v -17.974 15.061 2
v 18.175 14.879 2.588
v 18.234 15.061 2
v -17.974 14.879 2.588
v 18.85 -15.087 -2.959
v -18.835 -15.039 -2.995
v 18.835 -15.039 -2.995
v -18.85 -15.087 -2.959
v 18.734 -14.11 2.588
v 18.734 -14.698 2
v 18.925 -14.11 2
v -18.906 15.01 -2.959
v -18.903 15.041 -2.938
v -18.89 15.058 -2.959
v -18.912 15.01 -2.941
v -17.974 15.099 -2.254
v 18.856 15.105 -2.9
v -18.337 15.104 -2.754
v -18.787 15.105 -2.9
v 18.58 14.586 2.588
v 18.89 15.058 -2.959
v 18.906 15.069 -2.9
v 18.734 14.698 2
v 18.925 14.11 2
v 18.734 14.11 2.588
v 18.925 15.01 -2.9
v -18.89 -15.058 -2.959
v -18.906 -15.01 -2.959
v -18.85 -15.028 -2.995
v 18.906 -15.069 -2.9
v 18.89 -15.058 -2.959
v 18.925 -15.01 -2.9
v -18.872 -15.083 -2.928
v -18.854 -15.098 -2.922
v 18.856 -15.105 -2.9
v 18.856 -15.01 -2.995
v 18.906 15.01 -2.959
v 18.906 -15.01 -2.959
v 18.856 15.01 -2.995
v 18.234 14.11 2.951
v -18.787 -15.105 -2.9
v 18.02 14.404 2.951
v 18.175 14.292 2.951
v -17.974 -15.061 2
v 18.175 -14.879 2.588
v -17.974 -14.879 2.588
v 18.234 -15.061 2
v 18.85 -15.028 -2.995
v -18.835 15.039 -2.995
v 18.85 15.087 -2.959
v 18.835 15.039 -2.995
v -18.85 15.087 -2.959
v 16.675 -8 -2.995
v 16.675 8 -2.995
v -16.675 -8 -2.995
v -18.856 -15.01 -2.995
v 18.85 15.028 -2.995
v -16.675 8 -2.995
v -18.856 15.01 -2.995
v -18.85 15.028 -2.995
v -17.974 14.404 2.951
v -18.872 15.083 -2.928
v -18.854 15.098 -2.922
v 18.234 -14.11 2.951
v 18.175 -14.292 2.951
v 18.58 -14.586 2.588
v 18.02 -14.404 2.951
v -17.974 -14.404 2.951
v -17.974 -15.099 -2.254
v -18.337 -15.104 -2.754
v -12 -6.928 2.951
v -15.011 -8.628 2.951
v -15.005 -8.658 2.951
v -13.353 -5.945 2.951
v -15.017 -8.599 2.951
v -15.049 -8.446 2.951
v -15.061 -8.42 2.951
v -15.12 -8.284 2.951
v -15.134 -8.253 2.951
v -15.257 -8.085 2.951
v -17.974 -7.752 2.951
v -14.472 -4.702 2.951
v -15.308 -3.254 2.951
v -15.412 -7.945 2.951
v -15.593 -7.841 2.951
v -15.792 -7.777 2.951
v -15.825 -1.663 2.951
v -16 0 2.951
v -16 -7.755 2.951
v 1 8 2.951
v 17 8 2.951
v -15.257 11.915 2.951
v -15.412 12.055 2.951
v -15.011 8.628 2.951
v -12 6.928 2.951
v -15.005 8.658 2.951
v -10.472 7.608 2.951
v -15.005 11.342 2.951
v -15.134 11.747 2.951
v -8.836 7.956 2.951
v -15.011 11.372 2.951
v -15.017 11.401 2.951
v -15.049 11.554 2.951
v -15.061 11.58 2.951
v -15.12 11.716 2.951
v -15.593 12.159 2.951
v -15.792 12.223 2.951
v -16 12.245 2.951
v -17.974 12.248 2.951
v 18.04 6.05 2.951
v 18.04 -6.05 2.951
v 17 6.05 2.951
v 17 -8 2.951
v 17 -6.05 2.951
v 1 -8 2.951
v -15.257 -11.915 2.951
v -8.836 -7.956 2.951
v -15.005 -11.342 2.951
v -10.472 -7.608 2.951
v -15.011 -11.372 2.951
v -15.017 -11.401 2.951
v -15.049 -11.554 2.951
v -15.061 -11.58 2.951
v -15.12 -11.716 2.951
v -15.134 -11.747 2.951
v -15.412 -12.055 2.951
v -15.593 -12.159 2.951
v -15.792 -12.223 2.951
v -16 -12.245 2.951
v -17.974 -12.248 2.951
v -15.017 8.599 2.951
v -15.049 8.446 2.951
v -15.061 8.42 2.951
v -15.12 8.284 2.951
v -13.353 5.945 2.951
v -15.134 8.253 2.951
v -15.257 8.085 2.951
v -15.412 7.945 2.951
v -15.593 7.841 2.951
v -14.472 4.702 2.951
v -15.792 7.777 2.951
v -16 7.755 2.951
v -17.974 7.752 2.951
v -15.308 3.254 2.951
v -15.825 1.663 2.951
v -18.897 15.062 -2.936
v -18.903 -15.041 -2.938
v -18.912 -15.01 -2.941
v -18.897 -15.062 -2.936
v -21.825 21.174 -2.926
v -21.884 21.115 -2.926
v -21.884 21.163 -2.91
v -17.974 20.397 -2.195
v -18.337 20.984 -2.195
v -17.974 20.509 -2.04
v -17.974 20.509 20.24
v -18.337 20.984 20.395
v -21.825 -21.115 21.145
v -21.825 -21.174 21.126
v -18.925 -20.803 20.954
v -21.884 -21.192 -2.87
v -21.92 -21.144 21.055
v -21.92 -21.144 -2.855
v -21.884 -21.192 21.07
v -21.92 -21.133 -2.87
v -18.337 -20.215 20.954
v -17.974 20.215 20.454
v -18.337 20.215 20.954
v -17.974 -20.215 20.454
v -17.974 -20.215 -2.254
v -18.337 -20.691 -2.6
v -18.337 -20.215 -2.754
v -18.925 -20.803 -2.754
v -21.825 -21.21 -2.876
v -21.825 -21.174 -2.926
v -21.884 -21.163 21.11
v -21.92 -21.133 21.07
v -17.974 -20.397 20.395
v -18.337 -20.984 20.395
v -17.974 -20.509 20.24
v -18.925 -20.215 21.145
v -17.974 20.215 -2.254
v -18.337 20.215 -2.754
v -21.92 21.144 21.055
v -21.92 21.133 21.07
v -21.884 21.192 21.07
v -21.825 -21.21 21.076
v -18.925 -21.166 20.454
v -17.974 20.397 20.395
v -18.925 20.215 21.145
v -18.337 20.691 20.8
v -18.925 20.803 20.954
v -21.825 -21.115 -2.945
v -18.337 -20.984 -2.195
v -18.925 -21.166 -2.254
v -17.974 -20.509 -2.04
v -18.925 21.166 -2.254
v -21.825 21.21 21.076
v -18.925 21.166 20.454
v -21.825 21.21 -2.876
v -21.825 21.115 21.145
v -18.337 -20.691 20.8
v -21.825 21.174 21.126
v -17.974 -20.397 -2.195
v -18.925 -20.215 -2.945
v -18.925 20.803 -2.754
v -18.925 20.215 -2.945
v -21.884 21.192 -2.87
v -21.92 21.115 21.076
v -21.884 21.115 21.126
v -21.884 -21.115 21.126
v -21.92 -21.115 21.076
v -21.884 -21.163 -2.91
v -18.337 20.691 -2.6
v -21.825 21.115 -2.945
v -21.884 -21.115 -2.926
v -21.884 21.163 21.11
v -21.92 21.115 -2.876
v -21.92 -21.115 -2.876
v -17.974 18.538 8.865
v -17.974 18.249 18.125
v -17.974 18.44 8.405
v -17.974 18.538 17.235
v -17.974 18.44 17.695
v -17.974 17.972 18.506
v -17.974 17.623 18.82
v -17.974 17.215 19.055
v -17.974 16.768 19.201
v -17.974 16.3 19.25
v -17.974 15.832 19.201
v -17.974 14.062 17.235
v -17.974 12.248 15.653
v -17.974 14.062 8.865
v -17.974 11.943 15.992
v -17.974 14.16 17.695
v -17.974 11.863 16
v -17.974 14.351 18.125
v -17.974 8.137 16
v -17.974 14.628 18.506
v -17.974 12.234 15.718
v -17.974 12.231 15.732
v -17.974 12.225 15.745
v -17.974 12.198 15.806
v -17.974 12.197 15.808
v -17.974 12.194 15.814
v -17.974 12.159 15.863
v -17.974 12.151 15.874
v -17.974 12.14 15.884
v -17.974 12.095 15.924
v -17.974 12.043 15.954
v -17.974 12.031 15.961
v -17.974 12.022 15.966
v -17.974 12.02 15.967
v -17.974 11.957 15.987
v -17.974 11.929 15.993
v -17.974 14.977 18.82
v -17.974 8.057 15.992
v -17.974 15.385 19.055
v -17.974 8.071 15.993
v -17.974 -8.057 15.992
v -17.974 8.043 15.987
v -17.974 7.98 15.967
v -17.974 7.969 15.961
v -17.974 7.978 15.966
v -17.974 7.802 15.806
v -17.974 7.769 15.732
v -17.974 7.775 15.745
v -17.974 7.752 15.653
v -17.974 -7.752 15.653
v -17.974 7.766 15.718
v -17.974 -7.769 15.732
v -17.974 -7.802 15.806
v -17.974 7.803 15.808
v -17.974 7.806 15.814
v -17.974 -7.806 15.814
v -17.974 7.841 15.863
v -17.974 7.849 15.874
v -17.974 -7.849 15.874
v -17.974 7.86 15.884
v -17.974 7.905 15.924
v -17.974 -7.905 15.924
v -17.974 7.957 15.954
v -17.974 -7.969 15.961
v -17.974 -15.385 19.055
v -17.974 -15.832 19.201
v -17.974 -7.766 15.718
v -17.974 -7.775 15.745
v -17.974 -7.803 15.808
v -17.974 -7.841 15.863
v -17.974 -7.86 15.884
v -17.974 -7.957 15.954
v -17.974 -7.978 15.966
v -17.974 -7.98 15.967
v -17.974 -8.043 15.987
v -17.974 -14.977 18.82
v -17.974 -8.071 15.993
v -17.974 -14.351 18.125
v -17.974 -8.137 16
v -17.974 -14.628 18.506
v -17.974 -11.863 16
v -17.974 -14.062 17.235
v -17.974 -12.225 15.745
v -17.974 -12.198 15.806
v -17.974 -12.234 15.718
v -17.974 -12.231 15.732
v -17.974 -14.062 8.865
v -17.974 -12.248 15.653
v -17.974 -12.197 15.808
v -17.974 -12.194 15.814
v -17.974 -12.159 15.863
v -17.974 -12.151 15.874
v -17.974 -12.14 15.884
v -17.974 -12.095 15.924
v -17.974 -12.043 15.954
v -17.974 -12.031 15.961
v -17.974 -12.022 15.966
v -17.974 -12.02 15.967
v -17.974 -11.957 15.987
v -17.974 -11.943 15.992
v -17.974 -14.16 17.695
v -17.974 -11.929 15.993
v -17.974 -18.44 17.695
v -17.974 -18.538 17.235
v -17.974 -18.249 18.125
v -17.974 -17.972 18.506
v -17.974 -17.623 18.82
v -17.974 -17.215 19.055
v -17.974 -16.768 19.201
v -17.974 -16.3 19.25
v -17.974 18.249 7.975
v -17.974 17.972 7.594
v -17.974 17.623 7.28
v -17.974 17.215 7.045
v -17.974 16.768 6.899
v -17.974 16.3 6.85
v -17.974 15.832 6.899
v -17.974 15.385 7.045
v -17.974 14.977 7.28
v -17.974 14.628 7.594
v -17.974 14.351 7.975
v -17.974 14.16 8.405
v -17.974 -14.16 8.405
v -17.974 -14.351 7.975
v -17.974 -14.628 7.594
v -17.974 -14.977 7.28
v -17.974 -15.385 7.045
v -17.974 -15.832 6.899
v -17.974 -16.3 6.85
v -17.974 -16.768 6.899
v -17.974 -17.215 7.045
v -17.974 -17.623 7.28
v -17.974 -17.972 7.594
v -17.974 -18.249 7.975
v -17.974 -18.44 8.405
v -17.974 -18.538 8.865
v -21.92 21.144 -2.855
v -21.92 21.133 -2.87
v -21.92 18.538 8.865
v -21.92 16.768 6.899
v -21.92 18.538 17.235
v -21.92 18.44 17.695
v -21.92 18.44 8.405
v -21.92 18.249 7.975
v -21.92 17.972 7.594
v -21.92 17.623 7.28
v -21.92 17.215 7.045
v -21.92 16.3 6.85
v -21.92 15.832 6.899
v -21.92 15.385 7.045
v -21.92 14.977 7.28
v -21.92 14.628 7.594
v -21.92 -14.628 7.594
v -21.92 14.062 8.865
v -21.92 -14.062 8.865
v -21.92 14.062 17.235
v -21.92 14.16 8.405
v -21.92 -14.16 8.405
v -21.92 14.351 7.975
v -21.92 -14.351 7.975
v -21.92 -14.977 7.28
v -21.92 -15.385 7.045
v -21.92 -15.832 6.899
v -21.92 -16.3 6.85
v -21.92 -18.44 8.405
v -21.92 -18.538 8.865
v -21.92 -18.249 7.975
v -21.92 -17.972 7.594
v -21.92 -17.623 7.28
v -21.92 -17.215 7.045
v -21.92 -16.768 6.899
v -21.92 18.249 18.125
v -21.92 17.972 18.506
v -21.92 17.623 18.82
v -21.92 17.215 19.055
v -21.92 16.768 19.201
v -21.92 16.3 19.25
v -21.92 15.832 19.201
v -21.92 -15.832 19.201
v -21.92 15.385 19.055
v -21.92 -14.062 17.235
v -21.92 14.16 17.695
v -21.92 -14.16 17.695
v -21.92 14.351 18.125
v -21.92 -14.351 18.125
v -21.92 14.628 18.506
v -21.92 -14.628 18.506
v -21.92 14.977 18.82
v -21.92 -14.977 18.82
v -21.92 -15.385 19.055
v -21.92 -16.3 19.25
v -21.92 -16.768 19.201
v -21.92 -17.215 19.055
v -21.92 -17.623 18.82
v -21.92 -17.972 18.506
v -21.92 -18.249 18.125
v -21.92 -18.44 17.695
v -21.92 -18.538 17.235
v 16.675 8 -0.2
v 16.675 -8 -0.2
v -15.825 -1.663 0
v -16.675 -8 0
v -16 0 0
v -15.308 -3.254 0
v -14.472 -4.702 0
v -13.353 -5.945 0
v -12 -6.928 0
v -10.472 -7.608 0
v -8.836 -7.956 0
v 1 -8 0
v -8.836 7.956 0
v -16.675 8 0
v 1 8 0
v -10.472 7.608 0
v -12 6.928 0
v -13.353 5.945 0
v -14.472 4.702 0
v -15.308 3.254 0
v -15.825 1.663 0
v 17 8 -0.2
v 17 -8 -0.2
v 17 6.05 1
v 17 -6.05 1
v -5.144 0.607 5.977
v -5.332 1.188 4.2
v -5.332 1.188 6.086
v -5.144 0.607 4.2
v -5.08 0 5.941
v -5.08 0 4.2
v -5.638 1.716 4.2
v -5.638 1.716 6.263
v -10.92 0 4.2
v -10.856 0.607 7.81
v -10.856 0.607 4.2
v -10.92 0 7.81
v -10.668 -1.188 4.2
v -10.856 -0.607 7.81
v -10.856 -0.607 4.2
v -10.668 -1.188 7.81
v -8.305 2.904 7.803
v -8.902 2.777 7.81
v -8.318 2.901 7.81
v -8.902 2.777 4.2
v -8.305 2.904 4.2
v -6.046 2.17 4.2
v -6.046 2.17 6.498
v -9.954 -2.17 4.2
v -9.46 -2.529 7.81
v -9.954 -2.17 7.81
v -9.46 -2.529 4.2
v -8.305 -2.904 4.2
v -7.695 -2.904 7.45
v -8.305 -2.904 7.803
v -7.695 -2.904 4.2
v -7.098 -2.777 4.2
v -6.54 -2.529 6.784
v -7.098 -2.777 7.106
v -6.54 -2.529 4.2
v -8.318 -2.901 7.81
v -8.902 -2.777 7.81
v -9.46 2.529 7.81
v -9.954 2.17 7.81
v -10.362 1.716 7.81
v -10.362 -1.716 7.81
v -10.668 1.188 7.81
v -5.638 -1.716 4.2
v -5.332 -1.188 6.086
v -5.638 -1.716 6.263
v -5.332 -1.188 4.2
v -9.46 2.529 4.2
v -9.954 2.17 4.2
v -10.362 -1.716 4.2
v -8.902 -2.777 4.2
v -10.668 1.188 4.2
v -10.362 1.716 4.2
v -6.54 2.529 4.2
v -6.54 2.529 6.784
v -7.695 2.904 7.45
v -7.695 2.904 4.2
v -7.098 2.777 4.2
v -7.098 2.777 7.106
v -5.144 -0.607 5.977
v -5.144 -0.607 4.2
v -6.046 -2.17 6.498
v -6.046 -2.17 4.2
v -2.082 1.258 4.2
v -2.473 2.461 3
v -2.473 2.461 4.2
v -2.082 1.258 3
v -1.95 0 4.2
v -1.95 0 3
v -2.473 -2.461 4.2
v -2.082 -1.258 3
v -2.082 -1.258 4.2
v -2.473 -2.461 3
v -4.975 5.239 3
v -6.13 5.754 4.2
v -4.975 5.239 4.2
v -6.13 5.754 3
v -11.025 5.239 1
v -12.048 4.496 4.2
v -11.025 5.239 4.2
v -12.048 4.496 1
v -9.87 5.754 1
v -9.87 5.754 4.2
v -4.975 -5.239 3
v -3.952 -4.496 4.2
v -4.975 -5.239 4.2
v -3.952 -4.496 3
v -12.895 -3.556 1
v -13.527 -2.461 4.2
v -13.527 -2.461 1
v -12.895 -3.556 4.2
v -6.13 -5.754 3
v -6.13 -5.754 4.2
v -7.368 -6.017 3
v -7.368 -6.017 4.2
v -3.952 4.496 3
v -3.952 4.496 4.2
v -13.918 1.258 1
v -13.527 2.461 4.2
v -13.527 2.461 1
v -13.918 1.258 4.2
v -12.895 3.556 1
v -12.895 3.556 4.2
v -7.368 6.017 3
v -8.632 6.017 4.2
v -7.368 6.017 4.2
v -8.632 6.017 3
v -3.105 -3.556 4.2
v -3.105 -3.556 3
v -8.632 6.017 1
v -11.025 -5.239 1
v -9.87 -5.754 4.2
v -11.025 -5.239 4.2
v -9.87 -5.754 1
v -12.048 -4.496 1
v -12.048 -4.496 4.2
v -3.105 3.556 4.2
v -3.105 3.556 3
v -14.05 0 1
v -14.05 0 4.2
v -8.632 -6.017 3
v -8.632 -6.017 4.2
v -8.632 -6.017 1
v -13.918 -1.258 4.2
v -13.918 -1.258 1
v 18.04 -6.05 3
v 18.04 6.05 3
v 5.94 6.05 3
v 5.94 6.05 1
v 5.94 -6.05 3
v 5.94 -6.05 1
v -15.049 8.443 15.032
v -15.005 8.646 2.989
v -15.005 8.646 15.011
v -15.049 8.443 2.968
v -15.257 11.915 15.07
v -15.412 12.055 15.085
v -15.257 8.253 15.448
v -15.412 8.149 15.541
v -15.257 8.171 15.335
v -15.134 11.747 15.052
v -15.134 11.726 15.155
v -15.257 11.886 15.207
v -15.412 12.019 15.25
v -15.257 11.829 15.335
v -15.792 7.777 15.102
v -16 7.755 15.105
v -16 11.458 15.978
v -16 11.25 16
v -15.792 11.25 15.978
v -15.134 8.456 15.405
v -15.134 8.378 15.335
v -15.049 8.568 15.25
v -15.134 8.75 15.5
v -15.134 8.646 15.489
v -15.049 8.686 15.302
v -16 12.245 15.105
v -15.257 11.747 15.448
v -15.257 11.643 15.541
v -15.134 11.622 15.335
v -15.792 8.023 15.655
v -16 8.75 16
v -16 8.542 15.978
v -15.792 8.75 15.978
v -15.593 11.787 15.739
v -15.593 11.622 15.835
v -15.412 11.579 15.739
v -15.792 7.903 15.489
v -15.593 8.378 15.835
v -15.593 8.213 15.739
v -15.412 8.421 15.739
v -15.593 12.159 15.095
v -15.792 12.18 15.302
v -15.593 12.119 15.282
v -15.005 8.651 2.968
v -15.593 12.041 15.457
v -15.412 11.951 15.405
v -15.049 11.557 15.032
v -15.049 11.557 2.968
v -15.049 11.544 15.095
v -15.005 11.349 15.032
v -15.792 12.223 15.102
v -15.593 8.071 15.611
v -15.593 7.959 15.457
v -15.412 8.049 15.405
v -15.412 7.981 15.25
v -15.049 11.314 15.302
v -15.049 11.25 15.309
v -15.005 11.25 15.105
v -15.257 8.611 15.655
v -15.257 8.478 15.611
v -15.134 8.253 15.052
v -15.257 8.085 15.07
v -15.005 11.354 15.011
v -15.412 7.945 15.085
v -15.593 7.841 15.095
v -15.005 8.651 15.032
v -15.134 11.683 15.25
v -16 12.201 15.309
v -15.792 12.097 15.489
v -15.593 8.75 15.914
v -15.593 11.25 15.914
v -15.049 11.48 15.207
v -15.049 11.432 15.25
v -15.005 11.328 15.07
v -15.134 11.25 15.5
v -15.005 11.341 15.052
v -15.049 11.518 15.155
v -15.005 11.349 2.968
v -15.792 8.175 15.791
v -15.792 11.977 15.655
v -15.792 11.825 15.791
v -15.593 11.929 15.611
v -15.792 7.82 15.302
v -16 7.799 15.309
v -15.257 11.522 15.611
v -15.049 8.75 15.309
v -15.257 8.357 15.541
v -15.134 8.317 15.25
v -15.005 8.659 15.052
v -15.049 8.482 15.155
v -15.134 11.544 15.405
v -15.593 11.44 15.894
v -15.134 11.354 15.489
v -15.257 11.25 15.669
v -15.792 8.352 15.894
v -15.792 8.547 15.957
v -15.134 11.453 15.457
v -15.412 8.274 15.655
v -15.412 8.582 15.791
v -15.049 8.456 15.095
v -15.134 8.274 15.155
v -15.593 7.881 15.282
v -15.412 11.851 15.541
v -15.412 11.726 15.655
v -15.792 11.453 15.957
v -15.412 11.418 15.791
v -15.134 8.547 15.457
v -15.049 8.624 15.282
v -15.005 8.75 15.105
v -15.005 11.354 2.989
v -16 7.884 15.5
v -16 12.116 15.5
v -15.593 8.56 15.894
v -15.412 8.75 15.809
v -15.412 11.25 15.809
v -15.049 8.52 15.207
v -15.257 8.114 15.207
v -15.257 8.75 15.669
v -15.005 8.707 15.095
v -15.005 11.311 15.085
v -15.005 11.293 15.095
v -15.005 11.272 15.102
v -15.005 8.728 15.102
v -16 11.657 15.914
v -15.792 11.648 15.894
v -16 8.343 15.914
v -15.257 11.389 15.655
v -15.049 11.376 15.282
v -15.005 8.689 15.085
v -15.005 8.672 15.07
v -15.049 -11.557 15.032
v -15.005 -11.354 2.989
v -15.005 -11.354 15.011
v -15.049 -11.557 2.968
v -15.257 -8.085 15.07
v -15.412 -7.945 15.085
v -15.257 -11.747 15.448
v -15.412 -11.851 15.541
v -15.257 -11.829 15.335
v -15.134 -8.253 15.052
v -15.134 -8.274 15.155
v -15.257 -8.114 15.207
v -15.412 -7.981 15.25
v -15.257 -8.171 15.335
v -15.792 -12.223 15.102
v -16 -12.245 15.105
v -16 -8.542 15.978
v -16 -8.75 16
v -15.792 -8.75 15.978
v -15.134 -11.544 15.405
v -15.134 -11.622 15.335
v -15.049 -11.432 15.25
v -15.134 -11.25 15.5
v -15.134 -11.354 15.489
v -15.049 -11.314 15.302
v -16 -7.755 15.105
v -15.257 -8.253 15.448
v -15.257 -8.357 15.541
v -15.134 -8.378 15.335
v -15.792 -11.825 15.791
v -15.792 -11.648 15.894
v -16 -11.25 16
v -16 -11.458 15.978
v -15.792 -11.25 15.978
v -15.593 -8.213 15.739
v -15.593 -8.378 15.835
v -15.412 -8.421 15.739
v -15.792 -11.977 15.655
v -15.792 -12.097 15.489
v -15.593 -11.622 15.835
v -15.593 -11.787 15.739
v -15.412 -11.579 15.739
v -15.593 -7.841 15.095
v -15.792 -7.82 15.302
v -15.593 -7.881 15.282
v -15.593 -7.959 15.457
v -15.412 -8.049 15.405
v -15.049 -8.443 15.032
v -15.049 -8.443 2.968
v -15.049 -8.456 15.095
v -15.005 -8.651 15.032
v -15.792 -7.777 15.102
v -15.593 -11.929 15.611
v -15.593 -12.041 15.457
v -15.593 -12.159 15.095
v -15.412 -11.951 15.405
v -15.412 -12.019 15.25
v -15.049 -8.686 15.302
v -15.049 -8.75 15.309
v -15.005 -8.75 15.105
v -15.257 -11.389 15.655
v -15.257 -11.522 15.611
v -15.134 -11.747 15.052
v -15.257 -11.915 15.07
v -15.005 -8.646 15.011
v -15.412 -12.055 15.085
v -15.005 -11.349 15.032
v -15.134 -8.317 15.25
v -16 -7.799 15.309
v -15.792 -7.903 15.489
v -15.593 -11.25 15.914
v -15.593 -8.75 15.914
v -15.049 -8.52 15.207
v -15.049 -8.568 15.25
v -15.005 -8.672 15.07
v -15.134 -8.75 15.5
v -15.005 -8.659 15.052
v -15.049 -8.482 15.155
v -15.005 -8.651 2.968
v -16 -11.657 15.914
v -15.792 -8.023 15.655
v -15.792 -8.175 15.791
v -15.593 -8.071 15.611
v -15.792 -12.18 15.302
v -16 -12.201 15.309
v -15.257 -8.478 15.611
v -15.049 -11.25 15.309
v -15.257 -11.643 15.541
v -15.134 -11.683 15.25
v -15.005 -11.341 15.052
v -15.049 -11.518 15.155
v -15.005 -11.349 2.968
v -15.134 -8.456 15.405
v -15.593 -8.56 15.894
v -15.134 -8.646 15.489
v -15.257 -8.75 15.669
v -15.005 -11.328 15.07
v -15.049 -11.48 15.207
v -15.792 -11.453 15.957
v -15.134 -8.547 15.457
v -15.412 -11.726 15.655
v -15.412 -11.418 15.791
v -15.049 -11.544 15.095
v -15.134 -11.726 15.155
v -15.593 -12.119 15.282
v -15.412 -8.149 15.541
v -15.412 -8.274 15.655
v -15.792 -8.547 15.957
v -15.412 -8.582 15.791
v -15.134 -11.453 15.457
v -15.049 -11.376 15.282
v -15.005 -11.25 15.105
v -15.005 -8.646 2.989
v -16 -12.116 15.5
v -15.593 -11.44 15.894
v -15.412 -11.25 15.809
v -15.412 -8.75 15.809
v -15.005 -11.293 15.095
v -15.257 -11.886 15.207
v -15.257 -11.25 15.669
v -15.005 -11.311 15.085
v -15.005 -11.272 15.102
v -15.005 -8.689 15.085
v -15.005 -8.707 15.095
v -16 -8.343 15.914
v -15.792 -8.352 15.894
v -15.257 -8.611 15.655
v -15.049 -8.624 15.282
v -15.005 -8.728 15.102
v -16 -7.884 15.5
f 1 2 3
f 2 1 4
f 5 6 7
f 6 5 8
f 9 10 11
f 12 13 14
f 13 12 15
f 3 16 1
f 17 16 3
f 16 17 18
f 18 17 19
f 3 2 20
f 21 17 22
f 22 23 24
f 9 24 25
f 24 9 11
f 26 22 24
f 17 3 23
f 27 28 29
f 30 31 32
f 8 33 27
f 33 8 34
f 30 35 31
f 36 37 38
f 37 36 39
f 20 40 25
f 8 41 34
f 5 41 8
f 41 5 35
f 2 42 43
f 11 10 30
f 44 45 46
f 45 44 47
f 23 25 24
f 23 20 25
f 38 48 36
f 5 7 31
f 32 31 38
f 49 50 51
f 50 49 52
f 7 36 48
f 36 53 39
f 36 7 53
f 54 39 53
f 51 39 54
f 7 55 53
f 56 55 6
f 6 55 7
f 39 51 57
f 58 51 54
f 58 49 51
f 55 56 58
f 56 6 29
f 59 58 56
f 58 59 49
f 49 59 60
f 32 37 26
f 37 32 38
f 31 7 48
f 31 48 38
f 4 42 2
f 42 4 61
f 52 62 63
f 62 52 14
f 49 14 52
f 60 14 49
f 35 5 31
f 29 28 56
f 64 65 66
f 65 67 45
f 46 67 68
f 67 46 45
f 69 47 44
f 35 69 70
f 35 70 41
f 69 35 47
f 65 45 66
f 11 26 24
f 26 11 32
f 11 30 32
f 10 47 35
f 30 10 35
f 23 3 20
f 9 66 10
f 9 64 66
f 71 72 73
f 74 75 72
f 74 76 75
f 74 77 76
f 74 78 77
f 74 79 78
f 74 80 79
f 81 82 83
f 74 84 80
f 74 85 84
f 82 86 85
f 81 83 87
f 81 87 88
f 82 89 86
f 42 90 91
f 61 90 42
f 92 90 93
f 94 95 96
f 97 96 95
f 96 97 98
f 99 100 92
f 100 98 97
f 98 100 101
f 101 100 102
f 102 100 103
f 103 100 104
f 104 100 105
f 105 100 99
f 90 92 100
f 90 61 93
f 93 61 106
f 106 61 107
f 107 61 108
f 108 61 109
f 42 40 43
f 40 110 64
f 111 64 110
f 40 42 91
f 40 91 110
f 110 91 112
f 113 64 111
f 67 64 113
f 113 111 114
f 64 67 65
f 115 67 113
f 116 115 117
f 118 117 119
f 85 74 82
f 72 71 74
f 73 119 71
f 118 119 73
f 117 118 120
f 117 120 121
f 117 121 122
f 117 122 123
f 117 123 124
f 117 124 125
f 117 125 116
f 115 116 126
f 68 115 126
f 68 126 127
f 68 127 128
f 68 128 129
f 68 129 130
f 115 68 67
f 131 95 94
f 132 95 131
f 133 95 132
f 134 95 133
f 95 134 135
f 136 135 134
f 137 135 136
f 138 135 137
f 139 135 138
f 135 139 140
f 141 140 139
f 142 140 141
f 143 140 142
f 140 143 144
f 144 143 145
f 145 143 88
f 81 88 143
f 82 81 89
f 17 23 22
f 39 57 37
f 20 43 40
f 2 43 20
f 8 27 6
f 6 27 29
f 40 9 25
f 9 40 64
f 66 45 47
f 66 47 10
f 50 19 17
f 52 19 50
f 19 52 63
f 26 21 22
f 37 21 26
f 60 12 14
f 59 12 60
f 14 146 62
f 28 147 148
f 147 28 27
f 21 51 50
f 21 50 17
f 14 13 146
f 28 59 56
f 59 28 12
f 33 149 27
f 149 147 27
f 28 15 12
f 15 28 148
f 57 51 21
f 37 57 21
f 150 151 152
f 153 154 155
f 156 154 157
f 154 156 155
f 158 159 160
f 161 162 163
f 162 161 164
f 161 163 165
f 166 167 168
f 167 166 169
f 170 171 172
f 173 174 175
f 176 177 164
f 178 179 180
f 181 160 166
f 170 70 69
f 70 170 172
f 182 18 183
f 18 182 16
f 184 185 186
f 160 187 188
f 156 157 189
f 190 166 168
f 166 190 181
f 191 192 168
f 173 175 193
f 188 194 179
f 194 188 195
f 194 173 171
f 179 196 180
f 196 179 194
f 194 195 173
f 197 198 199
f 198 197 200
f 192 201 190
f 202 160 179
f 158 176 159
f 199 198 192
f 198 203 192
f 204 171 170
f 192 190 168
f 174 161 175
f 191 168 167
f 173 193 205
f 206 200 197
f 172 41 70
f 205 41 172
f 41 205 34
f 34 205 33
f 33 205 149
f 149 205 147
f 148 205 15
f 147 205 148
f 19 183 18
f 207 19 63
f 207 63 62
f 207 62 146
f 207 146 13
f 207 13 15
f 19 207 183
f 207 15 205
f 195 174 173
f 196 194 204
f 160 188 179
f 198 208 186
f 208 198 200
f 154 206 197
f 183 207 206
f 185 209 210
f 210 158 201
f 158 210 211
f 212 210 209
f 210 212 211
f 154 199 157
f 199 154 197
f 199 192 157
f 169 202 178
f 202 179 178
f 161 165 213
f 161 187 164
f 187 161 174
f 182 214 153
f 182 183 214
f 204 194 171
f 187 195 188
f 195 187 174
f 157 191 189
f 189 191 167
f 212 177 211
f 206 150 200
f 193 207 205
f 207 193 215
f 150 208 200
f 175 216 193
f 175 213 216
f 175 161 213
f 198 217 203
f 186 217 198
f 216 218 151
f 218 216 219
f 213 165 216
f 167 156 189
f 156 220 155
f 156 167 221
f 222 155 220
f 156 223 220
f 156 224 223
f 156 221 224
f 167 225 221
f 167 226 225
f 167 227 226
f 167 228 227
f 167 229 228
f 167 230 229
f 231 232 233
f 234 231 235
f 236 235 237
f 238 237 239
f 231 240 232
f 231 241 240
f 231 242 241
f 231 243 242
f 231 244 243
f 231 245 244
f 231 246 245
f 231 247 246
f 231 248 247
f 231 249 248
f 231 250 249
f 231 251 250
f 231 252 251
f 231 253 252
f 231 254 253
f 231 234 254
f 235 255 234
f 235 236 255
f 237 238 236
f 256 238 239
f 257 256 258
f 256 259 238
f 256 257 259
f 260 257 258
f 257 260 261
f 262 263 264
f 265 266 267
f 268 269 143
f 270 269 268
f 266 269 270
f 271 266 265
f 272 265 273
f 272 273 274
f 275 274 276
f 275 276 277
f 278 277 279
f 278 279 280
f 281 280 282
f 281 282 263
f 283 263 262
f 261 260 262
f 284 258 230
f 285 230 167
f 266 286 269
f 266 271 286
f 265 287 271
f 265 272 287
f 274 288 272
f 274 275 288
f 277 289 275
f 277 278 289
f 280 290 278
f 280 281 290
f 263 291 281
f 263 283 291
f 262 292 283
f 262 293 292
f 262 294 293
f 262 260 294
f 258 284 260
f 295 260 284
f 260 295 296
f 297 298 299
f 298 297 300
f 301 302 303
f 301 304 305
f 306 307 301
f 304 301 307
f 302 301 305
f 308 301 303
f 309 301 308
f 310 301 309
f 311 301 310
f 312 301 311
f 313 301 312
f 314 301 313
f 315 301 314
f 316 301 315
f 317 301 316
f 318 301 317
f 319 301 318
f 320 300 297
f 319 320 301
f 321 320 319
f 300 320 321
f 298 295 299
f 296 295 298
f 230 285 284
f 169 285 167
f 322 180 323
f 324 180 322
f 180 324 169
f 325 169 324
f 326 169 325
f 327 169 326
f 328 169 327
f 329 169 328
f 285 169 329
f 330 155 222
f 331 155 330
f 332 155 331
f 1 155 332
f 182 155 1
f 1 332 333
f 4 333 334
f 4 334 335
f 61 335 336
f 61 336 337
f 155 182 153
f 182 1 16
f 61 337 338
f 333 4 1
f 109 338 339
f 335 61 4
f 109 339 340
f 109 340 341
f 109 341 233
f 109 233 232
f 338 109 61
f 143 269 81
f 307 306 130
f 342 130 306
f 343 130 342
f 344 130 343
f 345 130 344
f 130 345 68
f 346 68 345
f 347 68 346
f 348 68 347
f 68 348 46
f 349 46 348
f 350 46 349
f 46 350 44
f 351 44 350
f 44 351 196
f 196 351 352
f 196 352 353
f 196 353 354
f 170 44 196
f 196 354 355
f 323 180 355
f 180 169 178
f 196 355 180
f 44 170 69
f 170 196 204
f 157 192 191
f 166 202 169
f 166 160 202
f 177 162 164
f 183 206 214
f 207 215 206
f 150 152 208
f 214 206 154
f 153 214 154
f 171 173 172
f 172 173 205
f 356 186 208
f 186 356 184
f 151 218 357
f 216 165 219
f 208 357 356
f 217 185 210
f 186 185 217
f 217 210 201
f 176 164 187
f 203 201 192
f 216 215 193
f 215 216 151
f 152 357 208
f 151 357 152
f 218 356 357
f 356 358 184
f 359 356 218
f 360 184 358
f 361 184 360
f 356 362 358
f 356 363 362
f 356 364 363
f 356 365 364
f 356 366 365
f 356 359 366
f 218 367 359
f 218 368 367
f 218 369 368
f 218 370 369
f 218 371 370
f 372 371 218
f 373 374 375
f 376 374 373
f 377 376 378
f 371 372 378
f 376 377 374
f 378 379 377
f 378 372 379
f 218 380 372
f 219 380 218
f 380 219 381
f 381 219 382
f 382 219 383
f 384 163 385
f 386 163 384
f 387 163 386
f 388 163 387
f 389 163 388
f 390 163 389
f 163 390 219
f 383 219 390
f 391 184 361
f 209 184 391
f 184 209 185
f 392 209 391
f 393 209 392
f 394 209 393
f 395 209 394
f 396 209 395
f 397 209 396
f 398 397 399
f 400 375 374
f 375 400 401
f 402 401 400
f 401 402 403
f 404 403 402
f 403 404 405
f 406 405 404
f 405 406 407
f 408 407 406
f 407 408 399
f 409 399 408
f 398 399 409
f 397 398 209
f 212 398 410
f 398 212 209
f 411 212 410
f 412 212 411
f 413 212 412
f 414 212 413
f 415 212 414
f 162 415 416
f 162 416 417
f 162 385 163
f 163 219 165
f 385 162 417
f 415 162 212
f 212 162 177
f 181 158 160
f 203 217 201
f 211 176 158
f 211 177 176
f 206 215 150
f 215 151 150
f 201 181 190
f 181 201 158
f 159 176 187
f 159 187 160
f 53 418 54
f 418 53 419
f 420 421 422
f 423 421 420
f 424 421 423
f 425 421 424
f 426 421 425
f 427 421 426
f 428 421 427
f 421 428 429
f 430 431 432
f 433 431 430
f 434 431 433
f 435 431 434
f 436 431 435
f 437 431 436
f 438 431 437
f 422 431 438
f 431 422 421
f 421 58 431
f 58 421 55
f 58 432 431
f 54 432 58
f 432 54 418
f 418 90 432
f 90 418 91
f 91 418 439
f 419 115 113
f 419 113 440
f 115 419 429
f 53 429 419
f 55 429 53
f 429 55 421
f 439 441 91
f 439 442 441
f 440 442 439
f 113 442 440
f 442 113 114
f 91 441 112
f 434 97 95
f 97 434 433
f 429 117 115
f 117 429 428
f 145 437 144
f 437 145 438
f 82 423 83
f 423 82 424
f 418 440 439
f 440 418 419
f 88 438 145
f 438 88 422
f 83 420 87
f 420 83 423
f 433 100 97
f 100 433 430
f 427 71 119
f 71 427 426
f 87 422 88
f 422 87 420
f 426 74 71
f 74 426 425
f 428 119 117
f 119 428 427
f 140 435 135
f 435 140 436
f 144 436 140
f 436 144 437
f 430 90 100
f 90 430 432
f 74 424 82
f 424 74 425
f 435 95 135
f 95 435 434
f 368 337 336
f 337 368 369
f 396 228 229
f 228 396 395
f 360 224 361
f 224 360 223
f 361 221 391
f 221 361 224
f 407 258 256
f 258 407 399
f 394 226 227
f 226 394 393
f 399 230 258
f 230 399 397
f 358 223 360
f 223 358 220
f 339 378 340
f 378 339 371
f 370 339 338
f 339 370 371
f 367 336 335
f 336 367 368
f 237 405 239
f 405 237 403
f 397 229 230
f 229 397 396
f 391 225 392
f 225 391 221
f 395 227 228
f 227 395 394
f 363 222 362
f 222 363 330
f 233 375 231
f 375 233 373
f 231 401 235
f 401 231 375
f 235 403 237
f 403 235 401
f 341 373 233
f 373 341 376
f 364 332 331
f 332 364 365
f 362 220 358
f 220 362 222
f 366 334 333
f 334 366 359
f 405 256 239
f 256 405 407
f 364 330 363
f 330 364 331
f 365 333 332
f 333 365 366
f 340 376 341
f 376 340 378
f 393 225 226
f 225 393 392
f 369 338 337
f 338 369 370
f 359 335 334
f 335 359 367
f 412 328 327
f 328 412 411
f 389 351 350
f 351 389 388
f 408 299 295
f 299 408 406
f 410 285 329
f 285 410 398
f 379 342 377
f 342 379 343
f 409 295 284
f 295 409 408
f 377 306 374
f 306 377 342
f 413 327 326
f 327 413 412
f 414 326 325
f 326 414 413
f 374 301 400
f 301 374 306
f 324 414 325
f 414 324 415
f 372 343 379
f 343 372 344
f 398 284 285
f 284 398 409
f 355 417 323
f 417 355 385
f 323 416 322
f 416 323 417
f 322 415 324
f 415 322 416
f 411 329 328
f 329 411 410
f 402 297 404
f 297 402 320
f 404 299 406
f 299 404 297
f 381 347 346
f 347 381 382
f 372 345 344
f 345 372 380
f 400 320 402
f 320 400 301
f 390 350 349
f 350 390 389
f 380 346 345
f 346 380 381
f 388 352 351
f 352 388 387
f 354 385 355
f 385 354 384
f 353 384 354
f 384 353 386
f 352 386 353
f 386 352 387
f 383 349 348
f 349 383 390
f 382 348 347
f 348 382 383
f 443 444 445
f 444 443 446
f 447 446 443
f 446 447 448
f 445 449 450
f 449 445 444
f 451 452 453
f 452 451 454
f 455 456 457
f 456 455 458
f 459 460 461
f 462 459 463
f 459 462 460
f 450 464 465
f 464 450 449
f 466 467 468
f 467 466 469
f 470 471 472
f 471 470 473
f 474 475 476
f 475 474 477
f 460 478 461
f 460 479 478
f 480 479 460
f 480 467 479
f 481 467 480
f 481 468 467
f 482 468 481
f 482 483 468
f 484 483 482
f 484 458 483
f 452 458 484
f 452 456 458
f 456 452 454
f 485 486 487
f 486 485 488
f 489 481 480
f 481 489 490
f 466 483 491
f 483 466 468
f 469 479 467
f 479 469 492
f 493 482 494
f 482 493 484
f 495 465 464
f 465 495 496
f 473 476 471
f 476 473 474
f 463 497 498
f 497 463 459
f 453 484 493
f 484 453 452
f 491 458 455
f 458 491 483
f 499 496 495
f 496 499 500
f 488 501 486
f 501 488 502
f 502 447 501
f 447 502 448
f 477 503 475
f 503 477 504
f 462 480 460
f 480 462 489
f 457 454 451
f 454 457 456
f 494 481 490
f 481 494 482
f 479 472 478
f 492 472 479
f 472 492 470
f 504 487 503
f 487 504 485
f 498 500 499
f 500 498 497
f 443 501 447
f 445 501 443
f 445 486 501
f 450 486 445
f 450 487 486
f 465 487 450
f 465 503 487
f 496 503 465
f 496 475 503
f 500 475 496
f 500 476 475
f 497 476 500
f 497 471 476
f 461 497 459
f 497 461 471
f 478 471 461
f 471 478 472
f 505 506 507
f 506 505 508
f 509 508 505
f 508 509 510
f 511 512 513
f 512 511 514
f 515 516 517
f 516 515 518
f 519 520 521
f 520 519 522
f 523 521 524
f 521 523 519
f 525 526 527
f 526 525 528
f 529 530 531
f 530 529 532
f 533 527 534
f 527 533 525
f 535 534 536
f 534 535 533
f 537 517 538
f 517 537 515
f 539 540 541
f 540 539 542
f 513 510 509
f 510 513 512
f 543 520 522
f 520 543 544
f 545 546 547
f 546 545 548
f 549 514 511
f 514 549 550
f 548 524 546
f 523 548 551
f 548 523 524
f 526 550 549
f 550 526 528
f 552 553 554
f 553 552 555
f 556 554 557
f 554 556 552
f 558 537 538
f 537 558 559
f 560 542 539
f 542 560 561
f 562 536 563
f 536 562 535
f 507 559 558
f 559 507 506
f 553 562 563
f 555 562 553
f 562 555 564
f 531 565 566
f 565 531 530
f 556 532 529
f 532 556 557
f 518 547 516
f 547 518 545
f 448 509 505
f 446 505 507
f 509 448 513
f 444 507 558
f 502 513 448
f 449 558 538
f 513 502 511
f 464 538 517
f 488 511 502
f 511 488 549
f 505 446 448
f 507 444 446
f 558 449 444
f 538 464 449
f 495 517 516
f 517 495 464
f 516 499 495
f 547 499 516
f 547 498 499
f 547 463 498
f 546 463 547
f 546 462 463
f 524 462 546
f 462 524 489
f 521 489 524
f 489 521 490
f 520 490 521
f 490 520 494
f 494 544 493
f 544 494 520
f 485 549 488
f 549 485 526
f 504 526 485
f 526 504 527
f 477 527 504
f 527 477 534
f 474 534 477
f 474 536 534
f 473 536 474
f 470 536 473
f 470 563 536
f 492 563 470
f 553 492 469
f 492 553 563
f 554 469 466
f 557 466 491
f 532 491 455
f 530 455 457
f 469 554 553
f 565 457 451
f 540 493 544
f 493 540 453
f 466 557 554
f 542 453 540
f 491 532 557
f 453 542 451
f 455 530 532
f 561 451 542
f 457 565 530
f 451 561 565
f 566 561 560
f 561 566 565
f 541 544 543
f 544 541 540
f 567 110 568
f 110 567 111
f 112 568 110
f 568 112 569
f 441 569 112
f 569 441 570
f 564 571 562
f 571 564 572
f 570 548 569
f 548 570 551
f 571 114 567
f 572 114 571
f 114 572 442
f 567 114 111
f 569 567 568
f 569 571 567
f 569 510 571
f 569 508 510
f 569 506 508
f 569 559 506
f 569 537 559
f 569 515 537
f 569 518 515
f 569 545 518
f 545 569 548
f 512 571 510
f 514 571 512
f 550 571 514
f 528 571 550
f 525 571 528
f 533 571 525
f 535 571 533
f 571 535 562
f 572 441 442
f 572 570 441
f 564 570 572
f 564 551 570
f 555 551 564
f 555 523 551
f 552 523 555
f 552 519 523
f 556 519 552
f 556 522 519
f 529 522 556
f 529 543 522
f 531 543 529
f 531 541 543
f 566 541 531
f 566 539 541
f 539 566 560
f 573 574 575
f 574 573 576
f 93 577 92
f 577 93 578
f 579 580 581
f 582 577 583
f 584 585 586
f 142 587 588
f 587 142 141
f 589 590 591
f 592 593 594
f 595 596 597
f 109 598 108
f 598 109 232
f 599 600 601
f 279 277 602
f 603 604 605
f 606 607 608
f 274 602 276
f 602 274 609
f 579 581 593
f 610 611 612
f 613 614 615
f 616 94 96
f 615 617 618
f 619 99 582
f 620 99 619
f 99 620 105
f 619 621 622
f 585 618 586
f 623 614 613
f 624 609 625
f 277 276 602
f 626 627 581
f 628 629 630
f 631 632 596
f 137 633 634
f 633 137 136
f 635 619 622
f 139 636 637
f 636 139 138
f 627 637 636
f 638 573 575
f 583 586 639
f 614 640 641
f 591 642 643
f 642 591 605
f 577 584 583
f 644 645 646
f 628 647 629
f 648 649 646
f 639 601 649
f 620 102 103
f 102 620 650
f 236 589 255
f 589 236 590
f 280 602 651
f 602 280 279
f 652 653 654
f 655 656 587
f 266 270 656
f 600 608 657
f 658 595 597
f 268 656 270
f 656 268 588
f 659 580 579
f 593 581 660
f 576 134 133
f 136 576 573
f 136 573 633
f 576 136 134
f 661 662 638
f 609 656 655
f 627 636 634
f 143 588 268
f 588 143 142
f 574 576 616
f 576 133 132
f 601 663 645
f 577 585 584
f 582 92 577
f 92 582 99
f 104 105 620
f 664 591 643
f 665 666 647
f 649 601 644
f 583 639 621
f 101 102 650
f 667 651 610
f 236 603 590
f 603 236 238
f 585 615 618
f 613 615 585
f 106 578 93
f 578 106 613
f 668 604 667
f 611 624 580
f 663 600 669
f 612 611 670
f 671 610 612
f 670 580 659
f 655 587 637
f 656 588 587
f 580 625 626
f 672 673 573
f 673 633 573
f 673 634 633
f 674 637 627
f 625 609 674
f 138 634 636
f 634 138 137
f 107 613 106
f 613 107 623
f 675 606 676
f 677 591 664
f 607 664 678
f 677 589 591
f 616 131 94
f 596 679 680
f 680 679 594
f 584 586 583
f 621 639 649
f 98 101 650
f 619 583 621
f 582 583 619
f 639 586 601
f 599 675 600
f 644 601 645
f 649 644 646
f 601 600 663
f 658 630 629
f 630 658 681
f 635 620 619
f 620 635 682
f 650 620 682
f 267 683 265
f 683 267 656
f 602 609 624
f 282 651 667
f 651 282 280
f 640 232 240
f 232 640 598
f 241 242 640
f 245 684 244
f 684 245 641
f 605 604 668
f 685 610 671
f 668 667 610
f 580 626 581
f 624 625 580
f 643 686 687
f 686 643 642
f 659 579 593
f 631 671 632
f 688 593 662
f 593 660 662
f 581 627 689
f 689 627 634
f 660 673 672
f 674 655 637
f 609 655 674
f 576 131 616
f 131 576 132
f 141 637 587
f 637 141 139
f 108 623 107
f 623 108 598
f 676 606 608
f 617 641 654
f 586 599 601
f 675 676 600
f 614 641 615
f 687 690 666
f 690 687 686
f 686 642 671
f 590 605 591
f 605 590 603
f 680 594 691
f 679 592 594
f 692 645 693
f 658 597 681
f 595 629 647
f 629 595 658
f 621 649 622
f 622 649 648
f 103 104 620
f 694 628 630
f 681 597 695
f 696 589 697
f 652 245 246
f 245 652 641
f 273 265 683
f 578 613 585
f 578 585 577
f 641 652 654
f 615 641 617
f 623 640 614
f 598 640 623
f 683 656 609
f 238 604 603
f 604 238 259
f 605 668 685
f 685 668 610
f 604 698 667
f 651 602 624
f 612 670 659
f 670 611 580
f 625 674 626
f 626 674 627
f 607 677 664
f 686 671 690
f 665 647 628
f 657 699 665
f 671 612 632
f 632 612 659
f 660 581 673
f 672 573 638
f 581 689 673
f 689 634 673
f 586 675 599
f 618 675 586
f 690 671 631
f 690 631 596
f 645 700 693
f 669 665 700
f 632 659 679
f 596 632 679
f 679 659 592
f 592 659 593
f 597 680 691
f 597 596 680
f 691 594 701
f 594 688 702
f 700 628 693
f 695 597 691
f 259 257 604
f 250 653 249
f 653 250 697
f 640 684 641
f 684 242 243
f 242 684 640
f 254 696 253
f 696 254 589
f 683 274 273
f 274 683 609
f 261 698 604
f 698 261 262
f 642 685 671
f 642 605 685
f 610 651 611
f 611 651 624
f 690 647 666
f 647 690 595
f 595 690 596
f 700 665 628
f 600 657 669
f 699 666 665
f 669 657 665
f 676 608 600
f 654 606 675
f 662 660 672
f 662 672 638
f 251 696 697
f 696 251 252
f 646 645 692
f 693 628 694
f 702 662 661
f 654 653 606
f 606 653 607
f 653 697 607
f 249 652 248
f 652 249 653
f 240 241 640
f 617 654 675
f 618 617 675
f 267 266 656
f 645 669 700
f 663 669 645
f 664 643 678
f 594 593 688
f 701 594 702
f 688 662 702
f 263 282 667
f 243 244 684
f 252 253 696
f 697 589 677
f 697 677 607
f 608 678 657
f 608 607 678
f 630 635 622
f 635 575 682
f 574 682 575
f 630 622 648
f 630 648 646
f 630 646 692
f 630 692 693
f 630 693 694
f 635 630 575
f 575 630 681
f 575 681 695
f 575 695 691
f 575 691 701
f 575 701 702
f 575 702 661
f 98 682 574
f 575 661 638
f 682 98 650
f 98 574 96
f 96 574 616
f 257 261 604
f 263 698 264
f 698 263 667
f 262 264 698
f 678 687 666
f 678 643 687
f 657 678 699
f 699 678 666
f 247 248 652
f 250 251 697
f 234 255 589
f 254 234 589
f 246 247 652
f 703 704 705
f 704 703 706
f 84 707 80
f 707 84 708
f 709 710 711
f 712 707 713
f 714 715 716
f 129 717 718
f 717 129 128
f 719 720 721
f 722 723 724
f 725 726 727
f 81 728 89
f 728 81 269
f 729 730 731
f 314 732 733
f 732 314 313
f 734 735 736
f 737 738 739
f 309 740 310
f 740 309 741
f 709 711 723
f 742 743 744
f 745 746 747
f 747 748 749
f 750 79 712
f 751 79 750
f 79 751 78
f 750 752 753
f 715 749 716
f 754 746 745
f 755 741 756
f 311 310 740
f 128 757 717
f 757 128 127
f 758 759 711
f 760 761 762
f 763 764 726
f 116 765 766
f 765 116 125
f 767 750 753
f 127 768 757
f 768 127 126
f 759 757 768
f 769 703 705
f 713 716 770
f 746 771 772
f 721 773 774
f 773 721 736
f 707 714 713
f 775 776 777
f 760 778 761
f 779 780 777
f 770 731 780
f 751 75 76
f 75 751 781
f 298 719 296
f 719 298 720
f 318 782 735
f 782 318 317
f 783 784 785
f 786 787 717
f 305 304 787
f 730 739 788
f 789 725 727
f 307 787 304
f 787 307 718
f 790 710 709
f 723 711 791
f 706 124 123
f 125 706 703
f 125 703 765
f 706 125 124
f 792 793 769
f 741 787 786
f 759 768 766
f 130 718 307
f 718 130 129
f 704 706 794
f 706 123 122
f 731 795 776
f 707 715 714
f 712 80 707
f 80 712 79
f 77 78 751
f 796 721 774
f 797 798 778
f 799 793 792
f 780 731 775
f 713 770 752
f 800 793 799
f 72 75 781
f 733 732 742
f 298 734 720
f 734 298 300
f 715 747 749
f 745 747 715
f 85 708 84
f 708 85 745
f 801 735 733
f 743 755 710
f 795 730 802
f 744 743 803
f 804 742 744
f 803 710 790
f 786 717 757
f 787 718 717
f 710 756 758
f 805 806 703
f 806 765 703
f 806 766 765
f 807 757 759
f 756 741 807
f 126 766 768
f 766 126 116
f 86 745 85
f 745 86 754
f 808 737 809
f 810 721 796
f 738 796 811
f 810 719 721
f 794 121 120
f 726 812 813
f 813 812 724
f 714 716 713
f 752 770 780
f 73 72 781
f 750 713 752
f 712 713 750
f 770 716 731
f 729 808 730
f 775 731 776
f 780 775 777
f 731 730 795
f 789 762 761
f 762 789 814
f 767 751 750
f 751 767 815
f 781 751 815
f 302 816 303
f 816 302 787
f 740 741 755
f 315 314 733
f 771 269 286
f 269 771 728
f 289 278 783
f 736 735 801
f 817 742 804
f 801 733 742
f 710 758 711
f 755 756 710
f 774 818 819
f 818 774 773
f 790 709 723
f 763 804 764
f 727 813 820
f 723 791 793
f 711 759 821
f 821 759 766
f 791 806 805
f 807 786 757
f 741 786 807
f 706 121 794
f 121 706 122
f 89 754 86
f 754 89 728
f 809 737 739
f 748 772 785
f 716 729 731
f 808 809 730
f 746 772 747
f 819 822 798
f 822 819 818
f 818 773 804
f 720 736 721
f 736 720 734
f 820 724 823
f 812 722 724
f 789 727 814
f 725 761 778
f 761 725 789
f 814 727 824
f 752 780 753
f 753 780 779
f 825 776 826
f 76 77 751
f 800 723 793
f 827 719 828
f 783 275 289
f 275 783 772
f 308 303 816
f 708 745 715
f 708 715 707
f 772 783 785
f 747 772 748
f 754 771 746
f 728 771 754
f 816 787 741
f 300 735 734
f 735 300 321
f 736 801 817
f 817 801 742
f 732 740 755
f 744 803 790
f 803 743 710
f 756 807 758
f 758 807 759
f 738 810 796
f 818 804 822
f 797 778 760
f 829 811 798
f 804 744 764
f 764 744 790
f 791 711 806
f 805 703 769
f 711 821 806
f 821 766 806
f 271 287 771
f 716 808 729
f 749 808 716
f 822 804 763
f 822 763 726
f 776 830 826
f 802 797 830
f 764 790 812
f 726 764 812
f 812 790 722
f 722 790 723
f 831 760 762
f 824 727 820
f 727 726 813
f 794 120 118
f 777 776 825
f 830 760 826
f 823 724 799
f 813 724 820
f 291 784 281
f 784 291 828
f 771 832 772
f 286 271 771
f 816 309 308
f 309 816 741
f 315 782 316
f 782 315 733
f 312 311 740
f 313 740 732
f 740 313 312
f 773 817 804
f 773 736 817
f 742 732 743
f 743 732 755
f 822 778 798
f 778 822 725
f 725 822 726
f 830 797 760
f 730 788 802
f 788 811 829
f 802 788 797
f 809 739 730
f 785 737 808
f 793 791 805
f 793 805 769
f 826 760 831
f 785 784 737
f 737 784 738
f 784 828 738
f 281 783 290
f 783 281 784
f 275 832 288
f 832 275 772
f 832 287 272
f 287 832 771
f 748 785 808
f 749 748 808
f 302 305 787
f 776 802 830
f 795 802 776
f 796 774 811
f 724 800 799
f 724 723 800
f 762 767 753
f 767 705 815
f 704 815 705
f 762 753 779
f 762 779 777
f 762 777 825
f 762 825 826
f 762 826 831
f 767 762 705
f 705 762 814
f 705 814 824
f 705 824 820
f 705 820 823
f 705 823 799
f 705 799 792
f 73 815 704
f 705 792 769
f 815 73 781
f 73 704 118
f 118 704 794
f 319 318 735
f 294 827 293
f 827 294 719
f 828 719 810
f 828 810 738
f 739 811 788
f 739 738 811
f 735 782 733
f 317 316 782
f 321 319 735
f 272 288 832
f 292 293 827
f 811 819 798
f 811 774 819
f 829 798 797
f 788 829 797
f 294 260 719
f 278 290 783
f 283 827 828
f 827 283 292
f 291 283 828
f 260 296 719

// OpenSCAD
module slot(d,l,h=10) {
  hull() {
    cylinder(d=d,h=h);
    translate([l-d,0,0])cylinder(d=d,h=h);
  }
}

module rcube(lx,ly,lz,r1=0.1,r2=1) {
   hull() {
      translate([lx/2-r1,ly/2-r1,-lz/2+r1]) sphere(r1);
      translate([lx/2-r1,-ly/2+r1,-lz/2+r1]) sphere(r1);
      translate([-lx/2+r1,ly/2-r1,-lz/2+r1]) sphere(r1);
      translate([-lx/2+r1,-ly/2+r1,-lz/2+r1]) sphere(r1);
      translate([lx/2-r2,ly/2-r2,lz/2-r2]) sphere(r2);
      translate([lx/2-r2,-ly/2+r2,lz/2-r2]) sphere(r2);
      translate([-lx/2+r2,ly/2-r2,lz/2-r2]) sphere(r2);
      translate([-lx/2+r2,-ly/2+r2,lz/2-r2]) sphere(r2);
   }
}


$fn=30;


difference() {
  union() {
    // cube ([37.85,30.22,6], center=true);
    rcube(37.85,30.22,6,$fn=10);
    translate([-37.85/2-1,0,15-5.9]) rotate([0,90,0]) rcube (24.09,42.43,4,,$fn=10);

  }
  translate([0,0,-2]) cube([33.35,16,4], center=true);
  translate([-8,0,-0.2])
  hull() {
    cylinder(d=16,h=4);
    translate([17,0,2]) cube([16,16, 4 ], center=true);
  }
  translate([-25,16.3, 17]) rotate([0,90,0]) slot(4.5,12.4);
  translate([-25,-16.3, 17]) rotate([0,90,0]) slot(4.5,12.4);;
}

l= 28.09;
d=12.1;
translate([-8,0,2]) {
      difference() {
           cylinder(d=5.84,h=3.61+2.2);
           translate([0,0,11.4]) rotate([0,30,0]) cube([20,20,10], center=true);
      }
      cylinder(d=d,h=2.2);
      hull() {
         translate([0,0,-1]) cylinder(d=d,h=2);
         translate([l - d +4,0,0]) cube([d,d, 2 ], center=true);
      }
}

translate([-17,10, 9]) rotate([0,90,0]) rcube(14,4.5,4);
translate([-17,-10, 9]) rotate([0,90,0]) rcube(14,4.5,4);
